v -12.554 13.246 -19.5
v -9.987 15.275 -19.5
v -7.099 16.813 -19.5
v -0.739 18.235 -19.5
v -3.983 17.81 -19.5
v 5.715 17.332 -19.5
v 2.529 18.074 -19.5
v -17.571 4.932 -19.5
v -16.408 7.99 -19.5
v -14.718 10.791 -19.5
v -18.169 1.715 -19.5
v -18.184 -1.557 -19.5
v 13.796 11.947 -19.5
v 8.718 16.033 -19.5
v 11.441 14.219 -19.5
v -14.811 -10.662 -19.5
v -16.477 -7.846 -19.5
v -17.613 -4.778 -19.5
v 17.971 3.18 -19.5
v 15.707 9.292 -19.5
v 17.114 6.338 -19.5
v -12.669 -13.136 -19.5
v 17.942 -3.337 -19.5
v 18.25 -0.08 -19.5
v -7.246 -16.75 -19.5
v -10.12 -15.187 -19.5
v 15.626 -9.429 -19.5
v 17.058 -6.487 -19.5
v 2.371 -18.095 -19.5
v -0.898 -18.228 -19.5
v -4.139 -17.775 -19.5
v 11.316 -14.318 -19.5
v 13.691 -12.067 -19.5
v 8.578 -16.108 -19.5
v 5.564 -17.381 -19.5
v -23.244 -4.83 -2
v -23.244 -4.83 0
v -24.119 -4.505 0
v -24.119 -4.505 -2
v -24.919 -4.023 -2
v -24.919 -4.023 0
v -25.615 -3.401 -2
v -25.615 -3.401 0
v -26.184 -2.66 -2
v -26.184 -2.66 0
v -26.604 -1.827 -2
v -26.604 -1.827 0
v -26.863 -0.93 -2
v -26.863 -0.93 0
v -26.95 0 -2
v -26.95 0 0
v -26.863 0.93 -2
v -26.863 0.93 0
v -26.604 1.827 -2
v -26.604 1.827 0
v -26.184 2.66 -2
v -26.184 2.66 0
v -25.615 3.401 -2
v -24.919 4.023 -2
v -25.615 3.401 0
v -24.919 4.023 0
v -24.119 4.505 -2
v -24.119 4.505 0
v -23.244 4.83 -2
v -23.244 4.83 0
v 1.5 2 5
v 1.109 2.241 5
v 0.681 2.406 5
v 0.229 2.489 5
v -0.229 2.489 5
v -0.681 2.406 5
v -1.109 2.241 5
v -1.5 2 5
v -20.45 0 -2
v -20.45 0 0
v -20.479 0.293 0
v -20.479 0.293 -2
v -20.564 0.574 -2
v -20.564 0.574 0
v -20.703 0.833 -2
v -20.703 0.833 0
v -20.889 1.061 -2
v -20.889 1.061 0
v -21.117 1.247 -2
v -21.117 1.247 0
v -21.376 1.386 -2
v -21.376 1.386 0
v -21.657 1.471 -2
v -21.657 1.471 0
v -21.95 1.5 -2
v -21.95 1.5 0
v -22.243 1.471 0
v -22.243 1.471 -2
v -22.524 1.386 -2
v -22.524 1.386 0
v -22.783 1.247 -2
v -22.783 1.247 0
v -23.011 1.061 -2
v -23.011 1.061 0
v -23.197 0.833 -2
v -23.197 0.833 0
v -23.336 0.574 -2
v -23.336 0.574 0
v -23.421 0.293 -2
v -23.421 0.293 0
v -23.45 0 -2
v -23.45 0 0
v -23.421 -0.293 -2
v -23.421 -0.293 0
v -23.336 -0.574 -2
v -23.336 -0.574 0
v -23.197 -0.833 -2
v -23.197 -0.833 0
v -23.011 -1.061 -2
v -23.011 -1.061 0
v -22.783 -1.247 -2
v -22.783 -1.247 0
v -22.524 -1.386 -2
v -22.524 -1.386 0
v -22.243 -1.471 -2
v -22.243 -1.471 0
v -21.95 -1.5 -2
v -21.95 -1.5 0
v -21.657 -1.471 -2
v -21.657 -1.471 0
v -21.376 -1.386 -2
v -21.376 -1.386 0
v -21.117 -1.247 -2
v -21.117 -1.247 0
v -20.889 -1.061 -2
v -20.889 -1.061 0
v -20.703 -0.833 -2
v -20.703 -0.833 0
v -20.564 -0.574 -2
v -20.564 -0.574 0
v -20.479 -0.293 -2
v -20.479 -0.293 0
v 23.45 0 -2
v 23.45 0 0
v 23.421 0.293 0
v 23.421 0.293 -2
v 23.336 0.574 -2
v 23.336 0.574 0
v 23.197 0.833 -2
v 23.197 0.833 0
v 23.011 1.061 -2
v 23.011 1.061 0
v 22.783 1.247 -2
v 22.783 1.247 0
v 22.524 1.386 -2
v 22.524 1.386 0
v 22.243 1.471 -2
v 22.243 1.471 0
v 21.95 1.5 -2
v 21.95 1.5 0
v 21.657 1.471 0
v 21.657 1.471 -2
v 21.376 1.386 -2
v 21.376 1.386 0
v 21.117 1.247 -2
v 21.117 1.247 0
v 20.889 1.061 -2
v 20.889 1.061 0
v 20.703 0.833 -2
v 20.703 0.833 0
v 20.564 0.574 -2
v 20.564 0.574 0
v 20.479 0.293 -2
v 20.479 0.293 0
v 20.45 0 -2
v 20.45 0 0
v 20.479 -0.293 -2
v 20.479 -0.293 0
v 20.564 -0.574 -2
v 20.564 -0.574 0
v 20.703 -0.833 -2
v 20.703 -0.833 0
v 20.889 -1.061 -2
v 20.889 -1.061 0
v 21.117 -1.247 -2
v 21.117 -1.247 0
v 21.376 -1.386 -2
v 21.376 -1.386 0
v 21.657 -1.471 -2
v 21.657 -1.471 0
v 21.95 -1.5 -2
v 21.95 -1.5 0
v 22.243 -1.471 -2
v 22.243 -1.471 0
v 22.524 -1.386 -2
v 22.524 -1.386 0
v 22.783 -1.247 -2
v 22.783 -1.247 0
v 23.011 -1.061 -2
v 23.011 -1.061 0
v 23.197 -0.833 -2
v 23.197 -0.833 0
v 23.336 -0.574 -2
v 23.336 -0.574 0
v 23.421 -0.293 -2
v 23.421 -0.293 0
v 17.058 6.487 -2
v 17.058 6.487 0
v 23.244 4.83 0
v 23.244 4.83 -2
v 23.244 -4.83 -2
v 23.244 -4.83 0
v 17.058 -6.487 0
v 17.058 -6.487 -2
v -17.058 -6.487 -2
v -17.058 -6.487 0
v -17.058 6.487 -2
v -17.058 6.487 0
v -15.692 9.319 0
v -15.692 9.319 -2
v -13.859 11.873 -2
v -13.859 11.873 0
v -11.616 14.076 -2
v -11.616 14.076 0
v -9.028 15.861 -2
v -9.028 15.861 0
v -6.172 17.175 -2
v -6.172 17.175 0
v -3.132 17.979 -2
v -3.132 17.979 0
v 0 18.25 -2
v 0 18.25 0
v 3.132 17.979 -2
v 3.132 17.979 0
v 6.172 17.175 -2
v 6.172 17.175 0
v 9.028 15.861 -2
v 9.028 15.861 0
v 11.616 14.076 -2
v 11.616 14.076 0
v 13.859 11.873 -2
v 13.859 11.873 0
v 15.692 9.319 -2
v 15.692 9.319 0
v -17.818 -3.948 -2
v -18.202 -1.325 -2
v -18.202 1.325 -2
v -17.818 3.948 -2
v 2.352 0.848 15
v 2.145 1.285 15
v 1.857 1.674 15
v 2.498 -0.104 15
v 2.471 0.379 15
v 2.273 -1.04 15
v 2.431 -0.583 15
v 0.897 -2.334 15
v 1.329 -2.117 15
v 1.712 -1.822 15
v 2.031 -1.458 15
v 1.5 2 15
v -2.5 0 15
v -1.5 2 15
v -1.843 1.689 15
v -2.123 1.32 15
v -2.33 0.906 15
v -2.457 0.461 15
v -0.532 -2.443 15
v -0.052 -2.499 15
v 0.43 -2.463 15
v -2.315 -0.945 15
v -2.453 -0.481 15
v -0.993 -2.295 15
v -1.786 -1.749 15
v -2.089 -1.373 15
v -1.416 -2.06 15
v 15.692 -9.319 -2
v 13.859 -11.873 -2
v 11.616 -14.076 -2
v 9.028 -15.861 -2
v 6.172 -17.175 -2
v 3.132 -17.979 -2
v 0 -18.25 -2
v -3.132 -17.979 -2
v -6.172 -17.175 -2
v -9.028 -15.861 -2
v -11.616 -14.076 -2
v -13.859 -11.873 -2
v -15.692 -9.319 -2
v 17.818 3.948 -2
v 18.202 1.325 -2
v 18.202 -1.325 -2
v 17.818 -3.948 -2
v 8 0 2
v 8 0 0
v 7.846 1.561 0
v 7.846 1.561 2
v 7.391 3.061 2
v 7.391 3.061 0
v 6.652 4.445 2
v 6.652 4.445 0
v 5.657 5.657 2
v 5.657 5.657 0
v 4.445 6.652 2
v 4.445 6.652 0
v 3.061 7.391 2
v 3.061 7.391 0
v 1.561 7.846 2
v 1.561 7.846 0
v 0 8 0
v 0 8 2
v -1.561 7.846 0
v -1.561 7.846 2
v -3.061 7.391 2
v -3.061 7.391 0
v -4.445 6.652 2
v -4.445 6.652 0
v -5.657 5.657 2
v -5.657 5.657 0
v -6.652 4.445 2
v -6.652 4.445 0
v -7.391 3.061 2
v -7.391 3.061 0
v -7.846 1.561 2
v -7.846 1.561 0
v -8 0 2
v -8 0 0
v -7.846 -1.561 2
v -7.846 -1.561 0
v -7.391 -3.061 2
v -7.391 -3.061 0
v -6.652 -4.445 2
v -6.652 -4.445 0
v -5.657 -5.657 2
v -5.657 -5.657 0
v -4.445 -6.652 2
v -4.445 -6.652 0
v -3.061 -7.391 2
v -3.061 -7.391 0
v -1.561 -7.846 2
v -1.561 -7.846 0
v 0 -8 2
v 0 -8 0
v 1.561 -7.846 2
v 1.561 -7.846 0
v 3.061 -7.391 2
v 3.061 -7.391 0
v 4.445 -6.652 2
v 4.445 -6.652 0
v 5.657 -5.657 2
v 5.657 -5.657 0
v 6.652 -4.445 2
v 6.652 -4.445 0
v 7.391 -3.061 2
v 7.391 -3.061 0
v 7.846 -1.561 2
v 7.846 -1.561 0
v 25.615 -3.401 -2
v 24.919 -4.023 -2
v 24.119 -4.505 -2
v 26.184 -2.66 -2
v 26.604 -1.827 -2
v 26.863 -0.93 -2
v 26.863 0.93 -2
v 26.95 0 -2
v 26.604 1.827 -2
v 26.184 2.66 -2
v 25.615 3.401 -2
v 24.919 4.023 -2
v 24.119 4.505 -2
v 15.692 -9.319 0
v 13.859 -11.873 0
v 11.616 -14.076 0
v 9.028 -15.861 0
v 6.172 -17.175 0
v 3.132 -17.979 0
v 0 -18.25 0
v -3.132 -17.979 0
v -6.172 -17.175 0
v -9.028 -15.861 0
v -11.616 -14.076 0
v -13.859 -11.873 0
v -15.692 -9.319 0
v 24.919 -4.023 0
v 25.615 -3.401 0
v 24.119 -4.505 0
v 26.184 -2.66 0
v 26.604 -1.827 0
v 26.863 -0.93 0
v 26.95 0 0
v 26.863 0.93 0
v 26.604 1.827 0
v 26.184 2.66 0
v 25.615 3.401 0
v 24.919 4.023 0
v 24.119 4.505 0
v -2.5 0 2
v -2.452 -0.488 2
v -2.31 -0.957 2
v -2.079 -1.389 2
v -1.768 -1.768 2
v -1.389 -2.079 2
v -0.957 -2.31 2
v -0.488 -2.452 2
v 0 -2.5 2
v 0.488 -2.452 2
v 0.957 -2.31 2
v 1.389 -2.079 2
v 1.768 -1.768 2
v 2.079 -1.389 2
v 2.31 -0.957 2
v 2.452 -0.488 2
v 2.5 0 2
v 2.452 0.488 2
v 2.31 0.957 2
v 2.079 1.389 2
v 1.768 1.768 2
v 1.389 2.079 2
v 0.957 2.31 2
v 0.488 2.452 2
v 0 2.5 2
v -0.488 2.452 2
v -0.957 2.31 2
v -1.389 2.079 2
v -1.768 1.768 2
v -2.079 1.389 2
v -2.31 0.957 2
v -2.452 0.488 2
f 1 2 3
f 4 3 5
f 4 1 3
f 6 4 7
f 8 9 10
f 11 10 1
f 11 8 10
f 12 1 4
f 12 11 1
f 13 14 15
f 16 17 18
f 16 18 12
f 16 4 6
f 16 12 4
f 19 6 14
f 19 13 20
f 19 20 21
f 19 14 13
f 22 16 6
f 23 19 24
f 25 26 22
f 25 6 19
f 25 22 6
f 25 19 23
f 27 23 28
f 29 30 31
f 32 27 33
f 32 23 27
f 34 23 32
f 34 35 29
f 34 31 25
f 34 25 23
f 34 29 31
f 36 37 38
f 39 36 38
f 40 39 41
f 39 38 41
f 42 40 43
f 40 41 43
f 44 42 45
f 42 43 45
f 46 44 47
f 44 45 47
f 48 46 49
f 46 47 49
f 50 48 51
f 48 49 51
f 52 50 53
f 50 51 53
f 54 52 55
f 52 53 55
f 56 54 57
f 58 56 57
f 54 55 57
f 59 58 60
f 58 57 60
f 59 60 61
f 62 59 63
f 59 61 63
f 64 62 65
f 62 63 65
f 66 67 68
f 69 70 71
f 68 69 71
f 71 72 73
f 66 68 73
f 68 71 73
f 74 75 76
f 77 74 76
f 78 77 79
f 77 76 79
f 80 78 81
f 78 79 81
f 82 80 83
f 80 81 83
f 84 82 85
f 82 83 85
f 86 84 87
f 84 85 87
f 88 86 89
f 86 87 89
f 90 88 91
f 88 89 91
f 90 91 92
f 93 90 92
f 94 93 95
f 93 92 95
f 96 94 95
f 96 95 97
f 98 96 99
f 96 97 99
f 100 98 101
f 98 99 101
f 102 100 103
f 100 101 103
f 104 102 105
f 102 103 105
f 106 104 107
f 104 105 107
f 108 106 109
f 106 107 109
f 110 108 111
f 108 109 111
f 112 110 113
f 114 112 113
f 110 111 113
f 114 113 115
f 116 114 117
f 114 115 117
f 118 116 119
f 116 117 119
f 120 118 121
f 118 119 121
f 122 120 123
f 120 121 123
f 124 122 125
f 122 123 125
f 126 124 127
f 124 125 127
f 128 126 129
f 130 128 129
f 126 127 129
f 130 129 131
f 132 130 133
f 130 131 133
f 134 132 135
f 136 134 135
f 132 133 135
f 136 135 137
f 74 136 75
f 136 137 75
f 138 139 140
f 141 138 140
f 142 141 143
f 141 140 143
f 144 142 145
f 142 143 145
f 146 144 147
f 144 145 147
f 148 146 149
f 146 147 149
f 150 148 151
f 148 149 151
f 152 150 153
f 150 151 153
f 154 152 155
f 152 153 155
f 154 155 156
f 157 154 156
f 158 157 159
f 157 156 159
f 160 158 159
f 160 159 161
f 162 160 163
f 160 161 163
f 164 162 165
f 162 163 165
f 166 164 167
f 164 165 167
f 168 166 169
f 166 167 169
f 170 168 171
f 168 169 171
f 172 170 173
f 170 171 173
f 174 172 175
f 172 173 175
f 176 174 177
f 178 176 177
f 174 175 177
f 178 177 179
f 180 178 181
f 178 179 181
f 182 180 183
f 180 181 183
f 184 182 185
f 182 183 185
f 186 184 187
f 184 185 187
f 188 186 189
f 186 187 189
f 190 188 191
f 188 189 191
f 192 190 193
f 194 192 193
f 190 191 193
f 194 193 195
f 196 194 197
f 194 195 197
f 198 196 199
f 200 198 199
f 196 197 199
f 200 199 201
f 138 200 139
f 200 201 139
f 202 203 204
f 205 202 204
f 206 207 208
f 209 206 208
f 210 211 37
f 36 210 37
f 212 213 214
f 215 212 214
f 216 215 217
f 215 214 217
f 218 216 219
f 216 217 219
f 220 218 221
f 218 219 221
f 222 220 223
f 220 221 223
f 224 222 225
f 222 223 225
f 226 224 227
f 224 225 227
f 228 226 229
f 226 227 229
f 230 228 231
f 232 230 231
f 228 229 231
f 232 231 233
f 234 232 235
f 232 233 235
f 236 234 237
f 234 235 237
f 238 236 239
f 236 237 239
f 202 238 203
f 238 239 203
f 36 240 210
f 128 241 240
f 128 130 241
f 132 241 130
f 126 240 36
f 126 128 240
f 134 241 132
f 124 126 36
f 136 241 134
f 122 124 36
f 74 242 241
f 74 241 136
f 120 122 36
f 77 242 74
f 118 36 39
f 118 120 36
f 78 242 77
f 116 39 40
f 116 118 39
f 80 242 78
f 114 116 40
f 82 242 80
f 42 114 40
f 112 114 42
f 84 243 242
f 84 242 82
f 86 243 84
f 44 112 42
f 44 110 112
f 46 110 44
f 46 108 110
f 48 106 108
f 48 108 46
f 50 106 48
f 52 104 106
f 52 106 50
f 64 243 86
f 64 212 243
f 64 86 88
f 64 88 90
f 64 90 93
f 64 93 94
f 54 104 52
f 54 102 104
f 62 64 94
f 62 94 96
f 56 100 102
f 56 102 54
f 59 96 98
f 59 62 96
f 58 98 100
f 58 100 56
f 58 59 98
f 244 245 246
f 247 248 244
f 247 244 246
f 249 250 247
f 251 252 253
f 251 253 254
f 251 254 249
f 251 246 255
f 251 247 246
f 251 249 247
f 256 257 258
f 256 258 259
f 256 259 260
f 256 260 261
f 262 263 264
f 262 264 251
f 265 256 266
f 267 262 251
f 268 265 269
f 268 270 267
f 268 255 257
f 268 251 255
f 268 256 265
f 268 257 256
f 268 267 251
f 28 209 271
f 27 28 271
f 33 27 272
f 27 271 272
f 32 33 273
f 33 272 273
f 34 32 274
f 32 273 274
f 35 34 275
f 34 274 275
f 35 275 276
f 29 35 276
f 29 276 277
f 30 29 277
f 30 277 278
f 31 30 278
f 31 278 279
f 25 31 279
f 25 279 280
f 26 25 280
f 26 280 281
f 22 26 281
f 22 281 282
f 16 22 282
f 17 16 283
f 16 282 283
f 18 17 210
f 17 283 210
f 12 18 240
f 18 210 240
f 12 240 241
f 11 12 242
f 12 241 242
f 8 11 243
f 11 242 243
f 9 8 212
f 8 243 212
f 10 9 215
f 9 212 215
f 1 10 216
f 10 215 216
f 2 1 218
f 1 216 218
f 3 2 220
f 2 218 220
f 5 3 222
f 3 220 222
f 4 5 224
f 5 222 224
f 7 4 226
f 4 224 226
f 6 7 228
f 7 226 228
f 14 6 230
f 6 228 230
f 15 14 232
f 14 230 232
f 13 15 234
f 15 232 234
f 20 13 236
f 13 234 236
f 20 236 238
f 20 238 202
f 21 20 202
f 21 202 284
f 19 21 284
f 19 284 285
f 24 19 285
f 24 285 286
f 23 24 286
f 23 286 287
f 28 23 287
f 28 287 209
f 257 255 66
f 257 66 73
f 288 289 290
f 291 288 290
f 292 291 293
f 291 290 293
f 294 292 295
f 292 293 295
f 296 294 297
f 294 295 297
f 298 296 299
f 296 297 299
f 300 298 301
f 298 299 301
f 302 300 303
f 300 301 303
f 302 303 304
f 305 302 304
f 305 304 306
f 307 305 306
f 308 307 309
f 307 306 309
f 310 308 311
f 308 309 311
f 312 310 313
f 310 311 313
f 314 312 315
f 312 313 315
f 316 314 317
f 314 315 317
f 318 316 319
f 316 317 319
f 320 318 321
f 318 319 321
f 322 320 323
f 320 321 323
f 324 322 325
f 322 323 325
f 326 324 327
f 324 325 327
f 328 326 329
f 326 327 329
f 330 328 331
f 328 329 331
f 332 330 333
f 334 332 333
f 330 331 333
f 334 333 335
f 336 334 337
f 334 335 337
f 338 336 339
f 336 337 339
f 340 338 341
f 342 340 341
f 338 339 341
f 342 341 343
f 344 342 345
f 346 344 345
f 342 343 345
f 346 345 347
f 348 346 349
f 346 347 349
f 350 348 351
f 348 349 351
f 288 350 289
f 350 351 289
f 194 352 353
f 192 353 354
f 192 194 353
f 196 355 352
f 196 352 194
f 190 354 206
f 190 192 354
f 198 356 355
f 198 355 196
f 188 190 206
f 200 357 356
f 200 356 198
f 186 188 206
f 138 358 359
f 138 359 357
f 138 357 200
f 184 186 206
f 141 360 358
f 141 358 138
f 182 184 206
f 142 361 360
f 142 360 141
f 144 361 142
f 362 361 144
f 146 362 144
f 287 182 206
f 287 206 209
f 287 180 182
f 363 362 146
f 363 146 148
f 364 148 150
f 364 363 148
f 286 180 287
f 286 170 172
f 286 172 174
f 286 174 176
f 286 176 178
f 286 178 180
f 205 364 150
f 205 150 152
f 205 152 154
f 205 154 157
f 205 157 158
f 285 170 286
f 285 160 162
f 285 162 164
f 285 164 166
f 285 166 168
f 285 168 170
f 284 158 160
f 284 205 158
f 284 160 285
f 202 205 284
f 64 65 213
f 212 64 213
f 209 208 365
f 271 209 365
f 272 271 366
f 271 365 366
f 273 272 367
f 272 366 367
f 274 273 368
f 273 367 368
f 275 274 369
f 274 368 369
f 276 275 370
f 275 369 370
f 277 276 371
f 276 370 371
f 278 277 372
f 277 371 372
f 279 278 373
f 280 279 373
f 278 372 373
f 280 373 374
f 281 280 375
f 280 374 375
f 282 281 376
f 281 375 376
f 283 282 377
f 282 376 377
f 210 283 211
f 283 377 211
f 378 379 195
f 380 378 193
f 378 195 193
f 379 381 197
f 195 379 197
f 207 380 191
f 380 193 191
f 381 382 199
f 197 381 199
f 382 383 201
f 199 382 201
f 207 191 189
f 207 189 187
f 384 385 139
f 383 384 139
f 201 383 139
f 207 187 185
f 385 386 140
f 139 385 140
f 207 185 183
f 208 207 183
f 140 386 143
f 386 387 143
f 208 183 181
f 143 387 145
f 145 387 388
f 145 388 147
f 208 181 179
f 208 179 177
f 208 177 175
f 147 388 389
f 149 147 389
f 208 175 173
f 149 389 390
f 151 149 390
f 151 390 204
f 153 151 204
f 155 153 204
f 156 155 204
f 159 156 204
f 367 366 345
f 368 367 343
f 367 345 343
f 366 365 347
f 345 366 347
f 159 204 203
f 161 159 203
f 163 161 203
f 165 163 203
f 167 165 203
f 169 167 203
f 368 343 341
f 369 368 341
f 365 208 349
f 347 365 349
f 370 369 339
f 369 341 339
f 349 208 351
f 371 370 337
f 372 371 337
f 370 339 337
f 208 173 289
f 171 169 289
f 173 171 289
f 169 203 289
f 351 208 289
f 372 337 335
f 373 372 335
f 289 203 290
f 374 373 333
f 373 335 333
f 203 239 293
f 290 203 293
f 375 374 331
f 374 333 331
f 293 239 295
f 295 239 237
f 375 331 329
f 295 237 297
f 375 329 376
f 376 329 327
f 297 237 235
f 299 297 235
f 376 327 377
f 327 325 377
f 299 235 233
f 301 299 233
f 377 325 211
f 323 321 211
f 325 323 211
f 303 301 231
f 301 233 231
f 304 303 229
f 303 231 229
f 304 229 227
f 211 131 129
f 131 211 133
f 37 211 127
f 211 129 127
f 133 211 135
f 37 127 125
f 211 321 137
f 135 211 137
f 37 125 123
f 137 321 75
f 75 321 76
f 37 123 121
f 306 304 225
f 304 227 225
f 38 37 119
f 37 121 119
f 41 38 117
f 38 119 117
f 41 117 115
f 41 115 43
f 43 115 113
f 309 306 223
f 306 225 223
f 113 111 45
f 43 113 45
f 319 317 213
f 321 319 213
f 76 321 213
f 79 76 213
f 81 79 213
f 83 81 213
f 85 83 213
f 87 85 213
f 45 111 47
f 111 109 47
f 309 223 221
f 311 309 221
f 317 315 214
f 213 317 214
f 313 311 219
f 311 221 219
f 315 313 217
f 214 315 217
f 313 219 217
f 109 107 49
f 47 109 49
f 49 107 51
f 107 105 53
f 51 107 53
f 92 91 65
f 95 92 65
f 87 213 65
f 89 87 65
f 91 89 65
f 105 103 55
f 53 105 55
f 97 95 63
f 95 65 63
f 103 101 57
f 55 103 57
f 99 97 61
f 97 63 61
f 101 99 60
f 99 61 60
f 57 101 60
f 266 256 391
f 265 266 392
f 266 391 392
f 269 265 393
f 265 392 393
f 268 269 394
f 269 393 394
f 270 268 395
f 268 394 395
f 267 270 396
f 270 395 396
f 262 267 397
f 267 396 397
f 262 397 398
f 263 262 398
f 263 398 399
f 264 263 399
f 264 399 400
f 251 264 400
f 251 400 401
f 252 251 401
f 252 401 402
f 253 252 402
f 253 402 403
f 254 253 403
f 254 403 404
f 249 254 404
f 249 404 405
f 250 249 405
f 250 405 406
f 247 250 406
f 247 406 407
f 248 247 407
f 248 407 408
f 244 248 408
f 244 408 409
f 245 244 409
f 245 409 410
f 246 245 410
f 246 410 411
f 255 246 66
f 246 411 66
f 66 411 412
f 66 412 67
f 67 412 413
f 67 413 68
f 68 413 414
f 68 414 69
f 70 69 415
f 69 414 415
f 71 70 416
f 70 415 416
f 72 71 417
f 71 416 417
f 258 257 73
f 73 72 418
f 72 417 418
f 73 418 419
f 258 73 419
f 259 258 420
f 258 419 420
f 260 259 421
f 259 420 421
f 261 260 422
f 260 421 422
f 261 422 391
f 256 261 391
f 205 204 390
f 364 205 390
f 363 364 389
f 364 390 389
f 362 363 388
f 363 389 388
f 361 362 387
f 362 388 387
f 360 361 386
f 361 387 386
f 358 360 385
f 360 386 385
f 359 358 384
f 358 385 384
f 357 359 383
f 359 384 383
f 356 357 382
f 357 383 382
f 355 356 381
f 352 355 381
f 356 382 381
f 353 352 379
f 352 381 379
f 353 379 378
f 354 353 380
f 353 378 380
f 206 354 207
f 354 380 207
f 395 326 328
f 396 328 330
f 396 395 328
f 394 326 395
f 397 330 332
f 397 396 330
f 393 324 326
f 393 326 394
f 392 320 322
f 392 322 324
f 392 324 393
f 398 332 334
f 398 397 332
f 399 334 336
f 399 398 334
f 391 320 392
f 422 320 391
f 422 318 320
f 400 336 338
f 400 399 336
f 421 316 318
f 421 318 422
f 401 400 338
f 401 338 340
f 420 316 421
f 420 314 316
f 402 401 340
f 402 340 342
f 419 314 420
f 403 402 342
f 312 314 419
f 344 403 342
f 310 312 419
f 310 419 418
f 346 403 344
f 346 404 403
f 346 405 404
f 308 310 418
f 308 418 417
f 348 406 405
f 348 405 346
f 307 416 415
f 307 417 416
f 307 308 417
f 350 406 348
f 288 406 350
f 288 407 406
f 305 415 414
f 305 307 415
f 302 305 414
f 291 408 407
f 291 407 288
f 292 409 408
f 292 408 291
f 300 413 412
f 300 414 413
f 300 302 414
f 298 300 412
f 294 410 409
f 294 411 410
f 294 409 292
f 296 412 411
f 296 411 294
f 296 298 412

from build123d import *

# Parameters (mm, degrees)
SKETCH1_R           = 1.5
BOSS_EXTRUDE1_DEPTH = 2
SKETCH2_R           = 18.25
BOSS_EXTRUDE2_DEPTH = 17.5
SKETCH3_R           = 8
BOSS_EXTRUDE3_DEPTH = 2
SKETCH4_R           = 2.5
BOSS_EXTRUDE4_DEPTH = 13
CUT_EXTRUDE1_START  = -10
CUT_EXTRUDE1_DEPTH  = 10


with BuildPart() as part:
    # Sketch1 → Boss-Extrude1 (new body)
    with BuildSketch(Plane.XY):
        with BuildLine():
            Line((-23.244095226, 4.829629131), (-17.058114991, 6.48715754))
            ThreePointArc((-17.058114991, 6.48715754), (0, 18.25), (17.058114991, 6.48715754))
            Line((17.058114991, 6.48715754), (23.244095226, 4.829629131))
            ThreePointArc((23.244095226, 4.829629131), (26.95, 0), (23.244095226, -4.829629131))
            Line((23.244095226, -4.829629131), (17.058114991, -6.48715754))
            ThreePointArc((17.058114991, -6.48715754), (0, -18.25), (-17.058114991, -6.48715754))
            Line((-17.058114991, -6.48715754), (-23.244095226, -4.829629131))
            ThreePointArc((-23.244095226, -4.829629131), (-26.95, 0), (-23.244095226, 4.829629131))
        make_face()
        with Locations((-21.95, 0)):
            Circle(SKETCH1_R, mode=Mode.SUBTRACT)
        with Locations((21.95, 0)):
            Circle(SKETCH1_R, mode=Mode.SUBTRACT)
    extrude(amount=-BOSS_EXTRUDE1_DEPTH)

    # Sketch2 → Boss-Extrude2 (add)
    with BuildSketch(Plane(origin=(0, 0, -2), x_dir=(-1, 0, 0), z_dir=(0, 0, -1))):
        with Locations(Location((0, 0, 0), (0, 0, 200.821681464))):
            Circle(SKETCH2_R)
    extrude(amount=BOSS_EXTRUDE2_DEPTH)

    # Sketch3 → Boss-Extrude3 (add)
    with BuildSketch(Plane.XY):
        Circle(SKETCH3_R)
    extrude(amount=BOSS_EXTRUDE3_DEPTH)

    # Sketch4 → Boss-Extrude4 (add)
    with BuildSketch(Plane.XY.offset(2)):
        with Locations(Location((0, 0, 0), (0, 0, 180))):
            Circle(SKETCH4_R)
    extrude(amount=BOSS_EXTRUDE4_DEPTH)

    # Sketch5 → Cut-Extrude1 (cut)
    with BuildSketch(Plane.XY.offset(15).offset(CUT_EXTRUDE1_START)):
        with BuildLine():
            Line((1.5, 2), (-1.5, 2))
            ThreePointArc((-1.5, 2), (0, 2.5), (1.5, 2))
        make_face()
    extrude(amount=CUT_EXTRUDE1_DEPTH, mode=Mode.SUBTRACT)


solid = part.part
